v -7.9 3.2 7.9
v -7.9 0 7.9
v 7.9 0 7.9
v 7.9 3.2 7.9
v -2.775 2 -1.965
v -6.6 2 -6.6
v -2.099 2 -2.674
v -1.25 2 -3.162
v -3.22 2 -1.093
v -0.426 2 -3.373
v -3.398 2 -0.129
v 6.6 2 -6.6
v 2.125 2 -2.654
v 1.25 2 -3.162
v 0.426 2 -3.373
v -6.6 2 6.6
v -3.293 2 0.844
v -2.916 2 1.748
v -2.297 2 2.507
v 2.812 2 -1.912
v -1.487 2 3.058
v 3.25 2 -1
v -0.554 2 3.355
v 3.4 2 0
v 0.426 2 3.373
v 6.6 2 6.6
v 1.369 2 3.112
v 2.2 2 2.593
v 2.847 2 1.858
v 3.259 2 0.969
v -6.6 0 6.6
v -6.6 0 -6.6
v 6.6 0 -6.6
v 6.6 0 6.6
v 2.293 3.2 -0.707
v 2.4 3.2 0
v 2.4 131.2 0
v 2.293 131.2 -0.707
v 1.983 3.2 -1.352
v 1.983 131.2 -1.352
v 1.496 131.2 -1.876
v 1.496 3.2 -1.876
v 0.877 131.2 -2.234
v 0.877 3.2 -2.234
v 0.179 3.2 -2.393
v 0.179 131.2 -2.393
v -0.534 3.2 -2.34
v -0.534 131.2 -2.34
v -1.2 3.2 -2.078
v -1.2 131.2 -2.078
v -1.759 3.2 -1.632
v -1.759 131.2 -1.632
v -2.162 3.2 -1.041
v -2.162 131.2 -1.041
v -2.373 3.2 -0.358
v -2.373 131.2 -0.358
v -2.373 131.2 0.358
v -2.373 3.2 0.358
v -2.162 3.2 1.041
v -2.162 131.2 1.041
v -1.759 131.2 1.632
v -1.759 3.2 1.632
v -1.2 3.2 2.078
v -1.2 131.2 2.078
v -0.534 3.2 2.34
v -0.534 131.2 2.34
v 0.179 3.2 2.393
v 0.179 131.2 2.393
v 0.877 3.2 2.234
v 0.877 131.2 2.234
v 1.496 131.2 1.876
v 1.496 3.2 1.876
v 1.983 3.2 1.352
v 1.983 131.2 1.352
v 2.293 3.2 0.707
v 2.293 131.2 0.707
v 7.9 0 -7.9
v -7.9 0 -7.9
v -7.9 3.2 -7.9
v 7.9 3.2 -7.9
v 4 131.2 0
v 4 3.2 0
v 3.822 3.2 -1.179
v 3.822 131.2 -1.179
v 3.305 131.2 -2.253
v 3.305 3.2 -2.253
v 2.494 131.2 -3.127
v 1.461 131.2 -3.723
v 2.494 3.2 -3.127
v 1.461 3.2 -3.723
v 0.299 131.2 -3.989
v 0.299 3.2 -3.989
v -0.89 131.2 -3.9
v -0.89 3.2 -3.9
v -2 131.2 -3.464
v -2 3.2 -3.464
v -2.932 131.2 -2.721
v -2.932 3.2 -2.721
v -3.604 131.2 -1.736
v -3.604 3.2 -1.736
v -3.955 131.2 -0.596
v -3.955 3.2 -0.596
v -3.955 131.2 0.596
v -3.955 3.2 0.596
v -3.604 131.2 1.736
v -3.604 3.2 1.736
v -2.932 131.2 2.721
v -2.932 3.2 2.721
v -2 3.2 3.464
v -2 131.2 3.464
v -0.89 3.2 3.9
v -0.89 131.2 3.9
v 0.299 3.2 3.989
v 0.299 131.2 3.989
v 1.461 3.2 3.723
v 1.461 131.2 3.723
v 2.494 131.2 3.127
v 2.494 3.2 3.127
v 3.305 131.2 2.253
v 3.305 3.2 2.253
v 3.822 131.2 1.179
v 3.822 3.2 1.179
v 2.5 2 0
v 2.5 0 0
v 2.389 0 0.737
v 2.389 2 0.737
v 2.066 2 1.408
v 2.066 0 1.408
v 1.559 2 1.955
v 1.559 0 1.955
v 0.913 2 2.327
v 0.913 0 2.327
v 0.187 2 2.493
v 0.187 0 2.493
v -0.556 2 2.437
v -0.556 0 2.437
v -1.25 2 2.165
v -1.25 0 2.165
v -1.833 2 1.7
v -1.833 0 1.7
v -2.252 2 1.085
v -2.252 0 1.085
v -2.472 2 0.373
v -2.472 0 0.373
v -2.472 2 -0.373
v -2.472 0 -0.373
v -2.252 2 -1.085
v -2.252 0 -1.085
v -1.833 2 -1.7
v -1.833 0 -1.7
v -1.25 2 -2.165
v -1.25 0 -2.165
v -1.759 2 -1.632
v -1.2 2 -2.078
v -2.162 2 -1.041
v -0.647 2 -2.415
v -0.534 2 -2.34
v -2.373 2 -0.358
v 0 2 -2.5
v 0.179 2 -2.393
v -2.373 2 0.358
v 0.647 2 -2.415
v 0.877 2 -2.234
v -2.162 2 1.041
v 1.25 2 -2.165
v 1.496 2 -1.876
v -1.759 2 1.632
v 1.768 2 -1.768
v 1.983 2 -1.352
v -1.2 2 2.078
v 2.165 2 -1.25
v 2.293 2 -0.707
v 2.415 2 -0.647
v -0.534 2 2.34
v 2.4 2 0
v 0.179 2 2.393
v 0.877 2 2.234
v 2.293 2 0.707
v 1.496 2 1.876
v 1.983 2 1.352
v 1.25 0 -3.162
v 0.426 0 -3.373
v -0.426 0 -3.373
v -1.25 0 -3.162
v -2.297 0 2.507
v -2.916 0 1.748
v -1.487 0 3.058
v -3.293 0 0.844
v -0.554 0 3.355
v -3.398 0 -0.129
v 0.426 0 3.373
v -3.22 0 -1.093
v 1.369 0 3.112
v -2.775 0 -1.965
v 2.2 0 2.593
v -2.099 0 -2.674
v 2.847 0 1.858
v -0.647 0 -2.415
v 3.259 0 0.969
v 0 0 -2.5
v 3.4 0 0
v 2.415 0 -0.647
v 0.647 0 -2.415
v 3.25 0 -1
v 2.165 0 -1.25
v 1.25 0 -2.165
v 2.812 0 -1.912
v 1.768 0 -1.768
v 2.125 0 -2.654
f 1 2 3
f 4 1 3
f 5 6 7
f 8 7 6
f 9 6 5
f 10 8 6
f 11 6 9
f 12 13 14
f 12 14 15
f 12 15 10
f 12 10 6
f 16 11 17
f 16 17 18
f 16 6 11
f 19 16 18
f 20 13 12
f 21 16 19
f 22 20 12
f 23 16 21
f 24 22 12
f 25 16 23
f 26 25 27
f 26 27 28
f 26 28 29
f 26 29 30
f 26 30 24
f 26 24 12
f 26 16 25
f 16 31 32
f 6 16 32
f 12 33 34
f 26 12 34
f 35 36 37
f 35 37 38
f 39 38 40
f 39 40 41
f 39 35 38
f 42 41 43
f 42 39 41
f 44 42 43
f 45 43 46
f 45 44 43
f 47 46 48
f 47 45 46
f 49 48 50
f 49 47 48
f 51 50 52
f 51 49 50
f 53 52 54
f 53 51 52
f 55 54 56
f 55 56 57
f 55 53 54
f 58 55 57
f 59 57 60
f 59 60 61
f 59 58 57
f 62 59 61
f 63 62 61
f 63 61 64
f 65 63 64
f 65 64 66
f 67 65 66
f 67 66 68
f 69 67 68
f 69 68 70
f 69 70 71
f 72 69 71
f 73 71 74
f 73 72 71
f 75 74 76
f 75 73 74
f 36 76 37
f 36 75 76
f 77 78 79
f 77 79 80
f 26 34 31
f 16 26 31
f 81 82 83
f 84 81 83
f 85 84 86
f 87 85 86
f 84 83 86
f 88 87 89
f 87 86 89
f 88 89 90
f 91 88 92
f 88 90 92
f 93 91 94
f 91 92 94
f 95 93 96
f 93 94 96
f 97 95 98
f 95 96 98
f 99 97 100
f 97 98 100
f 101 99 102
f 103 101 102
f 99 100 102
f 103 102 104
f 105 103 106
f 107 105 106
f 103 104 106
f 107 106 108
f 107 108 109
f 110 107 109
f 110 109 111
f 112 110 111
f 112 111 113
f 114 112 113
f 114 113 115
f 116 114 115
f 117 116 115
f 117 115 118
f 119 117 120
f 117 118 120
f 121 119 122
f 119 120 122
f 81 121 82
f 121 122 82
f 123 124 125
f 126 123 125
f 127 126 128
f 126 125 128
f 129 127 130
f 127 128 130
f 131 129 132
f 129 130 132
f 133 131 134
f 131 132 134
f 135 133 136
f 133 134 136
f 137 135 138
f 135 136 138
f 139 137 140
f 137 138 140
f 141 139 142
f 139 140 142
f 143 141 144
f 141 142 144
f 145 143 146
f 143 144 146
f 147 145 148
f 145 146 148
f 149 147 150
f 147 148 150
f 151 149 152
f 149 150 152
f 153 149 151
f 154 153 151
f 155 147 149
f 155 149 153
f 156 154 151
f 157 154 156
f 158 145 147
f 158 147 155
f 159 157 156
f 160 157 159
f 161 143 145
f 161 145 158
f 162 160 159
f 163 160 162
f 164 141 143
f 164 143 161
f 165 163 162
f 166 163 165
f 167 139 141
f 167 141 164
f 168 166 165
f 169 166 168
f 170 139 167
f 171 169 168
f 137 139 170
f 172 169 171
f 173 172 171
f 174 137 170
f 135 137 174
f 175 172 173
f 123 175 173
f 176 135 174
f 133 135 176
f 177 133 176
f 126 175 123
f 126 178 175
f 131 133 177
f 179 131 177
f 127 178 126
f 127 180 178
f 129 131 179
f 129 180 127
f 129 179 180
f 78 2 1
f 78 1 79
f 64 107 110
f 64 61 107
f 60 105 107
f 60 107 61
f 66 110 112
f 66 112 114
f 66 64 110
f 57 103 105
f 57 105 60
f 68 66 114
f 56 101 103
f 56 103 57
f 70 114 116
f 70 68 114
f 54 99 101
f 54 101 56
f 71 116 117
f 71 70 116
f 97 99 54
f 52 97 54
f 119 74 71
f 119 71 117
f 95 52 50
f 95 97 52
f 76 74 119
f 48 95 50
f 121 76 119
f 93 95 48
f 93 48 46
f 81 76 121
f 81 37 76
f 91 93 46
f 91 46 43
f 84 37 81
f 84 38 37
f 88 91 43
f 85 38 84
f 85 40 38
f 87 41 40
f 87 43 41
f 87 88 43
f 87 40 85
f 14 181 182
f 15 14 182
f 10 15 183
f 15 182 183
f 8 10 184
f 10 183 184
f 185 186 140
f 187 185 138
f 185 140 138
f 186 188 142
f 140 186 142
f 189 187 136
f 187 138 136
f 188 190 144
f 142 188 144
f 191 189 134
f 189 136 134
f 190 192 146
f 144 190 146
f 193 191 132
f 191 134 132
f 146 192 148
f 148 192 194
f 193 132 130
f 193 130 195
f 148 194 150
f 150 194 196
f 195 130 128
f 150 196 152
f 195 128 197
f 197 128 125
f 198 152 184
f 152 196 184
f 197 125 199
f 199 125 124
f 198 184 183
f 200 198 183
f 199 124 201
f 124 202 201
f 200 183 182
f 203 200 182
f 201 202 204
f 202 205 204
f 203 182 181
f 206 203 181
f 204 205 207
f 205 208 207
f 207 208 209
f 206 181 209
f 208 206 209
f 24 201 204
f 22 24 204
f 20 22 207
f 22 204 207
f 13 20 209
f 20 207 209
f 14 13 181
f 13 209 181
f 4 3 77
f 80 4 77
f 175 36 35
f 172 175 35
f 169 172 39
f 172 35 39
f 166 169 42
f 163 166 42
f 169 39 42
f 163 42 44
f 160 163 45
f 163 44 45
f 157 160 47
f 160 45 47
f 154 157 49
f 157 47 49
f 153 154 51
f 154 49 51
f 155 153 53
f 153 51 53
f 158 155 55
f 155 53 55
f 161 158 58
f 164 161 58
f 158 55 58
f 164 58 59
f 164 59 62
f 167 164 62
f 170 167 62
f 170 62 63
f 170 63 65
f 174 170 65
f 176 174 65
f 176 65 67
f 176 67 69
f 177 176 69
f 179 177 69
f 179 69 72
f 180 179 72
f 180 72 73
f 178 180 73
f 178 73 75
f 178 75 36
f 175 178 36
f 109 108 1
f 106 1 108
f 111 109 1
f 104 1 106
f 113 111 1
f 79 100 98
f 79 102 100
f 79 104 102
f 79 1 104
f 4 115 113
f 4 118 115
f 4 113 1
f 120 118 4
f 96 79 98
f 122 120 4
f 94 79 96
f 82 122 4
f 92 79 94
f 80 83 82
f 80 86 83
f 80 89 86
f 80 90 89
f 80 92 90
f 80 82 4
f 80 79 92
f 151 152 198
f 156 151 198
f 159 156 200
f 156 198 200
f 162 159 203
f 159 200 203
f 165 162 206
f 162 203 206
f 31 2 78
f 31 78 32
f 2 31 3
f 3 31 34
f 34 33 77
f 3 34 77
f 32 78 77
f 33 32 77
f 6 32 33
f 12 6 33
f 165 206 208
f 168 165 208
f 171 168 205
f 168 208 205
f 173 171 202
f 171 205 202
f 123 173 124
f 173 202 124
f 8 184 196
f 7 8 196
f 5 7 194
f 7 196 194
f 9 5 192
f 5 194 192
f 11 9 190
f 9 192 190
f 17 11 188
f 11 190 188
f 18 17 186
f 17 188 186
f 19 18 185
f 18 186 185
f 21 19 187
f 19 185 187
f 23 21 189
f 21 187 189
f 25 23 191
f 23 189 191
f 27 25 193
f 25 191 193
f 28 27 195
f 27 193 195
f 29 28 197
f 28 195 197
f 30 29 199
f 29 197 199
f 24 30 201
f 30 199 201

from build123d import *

# Parameters (mm, degrees)
SKETCH1_W             = 15.8
SKETCH1_H             = 15.8
BASE_DEPTH            = 3.2
BOTTOM_CUT_DEPTH      = 2
SKETCH3_R             = 4
SKETCH3_R_2           = 2.4
LAMP_POST_DEPTH       = 128
WIRE_BOTTOM_CUT_REACH = 5.2
SKETCH4_R             = 2.4


with BuildPart() as part:
    # Sketch1 → Base (new body)
    with BuildSketch(Plane(origin=(0, 0, 0), x_dir=(1, 0, 0), z_dir=(0, 1, 0))):
        Rectangle(SKETCH1_W, SKETCH1_H)
    extrude(amount=BASE_DEPTH)

    # Sketch2 → Bottom cut (cut)
    with BuildSketch(Plane.XZ):
        with BuildLine():
            Line((6.6, -6.6), (6.6, 6.6))
            Line((6.6, 6.6), (-6.6, 6.6))
            Line((-6.6, 6.6), (-6.6, -6.6))
            Line((-6.6, -6.6), (-1.25, -6.6))
            Line((-1.25, -6.6), (-1.25, -3.161882351))
            ThreePointArc((-1.25, -3.161882351), (-1.911805429, 2.811583184), (3.4, 0))
            ThreePointArc((3.4, 0), (2.811583184, -1.911805429), (1.25, -3.161882351))
            Line((1.25, -3.161882351), (1.25, -6.6))
            Line((1.25, -6.6), (6.6, -6.6))
        make_face()
        with BuildLine():
            ThreePointArc((-1.25, -2.165063509), (0, -2.5), (1.25, -2.165063509))
            Line((1.25, -2.165063509), (-1.25, -2.165063509))
        make_face()
        with BuildLine():
            Line((-1.25, -2.165063509), (1.25, -2.165063509))
            ThreePointArc((1.25, -2.165063509), (2.165063509, -1.25), (2.5, 0))
            ThreePointArc((2.5, 0), (-1.25, 2.165063509), (-1.25, -2.165063509))
        make_face()
        with BuildLine():
            Line((-1.25, -6.6), (1.25, -6.6))
            Line((1.25, -6.6), (1.25, -3.161882351))
            ThreePointArc((1.25, -3.161882351), (0, -3.4), (-1.25, -3.161882351))
            Line((-1.25, -3.161882351), (-1.25, -6.6))
        make_face()
    extrude(amount=-BOTTOM_CUT_DEPTH, mode=Mode.SUBTRACT)

    # Sketch3 → Lamp post (add)
    with BuildSketch(Plane(origin=(0, 3.2, 0), x_dir=(1, 0, 0), z_dir=(0, 1, 0))):
        Circle(SKETCH3_R)
        Circle(SKETCH3_R_2, mode=Mode.SUBTRACT)
    extrude(amount=LAMP_POST_DEPTH)

    # Sketch4 → Wire bottom cut (cut, up to next)
    with BuildSketch(Plane(origin=(0, 3.2, 0), x_dir=(1, 0, 0), z_dir=(0, 1, 0)), mode=Mode.PRIVATE) as wire_bottom_cut_sk1:
        Circle(SKETCH4_R)
    wire_bottom_cut_tool1 = extrude(wire_bottom_cut_sk1.sketch, amount=-WIRE_BOTTOM_CUT_REACH, mode=Mode.PRIVATE) & part.part
    add(wire_bottom_cut_tool1.solids().sort_by_distance((0, 3.2, 0))[0], mode=Mode.SUBTRACT)


solid = part.part
